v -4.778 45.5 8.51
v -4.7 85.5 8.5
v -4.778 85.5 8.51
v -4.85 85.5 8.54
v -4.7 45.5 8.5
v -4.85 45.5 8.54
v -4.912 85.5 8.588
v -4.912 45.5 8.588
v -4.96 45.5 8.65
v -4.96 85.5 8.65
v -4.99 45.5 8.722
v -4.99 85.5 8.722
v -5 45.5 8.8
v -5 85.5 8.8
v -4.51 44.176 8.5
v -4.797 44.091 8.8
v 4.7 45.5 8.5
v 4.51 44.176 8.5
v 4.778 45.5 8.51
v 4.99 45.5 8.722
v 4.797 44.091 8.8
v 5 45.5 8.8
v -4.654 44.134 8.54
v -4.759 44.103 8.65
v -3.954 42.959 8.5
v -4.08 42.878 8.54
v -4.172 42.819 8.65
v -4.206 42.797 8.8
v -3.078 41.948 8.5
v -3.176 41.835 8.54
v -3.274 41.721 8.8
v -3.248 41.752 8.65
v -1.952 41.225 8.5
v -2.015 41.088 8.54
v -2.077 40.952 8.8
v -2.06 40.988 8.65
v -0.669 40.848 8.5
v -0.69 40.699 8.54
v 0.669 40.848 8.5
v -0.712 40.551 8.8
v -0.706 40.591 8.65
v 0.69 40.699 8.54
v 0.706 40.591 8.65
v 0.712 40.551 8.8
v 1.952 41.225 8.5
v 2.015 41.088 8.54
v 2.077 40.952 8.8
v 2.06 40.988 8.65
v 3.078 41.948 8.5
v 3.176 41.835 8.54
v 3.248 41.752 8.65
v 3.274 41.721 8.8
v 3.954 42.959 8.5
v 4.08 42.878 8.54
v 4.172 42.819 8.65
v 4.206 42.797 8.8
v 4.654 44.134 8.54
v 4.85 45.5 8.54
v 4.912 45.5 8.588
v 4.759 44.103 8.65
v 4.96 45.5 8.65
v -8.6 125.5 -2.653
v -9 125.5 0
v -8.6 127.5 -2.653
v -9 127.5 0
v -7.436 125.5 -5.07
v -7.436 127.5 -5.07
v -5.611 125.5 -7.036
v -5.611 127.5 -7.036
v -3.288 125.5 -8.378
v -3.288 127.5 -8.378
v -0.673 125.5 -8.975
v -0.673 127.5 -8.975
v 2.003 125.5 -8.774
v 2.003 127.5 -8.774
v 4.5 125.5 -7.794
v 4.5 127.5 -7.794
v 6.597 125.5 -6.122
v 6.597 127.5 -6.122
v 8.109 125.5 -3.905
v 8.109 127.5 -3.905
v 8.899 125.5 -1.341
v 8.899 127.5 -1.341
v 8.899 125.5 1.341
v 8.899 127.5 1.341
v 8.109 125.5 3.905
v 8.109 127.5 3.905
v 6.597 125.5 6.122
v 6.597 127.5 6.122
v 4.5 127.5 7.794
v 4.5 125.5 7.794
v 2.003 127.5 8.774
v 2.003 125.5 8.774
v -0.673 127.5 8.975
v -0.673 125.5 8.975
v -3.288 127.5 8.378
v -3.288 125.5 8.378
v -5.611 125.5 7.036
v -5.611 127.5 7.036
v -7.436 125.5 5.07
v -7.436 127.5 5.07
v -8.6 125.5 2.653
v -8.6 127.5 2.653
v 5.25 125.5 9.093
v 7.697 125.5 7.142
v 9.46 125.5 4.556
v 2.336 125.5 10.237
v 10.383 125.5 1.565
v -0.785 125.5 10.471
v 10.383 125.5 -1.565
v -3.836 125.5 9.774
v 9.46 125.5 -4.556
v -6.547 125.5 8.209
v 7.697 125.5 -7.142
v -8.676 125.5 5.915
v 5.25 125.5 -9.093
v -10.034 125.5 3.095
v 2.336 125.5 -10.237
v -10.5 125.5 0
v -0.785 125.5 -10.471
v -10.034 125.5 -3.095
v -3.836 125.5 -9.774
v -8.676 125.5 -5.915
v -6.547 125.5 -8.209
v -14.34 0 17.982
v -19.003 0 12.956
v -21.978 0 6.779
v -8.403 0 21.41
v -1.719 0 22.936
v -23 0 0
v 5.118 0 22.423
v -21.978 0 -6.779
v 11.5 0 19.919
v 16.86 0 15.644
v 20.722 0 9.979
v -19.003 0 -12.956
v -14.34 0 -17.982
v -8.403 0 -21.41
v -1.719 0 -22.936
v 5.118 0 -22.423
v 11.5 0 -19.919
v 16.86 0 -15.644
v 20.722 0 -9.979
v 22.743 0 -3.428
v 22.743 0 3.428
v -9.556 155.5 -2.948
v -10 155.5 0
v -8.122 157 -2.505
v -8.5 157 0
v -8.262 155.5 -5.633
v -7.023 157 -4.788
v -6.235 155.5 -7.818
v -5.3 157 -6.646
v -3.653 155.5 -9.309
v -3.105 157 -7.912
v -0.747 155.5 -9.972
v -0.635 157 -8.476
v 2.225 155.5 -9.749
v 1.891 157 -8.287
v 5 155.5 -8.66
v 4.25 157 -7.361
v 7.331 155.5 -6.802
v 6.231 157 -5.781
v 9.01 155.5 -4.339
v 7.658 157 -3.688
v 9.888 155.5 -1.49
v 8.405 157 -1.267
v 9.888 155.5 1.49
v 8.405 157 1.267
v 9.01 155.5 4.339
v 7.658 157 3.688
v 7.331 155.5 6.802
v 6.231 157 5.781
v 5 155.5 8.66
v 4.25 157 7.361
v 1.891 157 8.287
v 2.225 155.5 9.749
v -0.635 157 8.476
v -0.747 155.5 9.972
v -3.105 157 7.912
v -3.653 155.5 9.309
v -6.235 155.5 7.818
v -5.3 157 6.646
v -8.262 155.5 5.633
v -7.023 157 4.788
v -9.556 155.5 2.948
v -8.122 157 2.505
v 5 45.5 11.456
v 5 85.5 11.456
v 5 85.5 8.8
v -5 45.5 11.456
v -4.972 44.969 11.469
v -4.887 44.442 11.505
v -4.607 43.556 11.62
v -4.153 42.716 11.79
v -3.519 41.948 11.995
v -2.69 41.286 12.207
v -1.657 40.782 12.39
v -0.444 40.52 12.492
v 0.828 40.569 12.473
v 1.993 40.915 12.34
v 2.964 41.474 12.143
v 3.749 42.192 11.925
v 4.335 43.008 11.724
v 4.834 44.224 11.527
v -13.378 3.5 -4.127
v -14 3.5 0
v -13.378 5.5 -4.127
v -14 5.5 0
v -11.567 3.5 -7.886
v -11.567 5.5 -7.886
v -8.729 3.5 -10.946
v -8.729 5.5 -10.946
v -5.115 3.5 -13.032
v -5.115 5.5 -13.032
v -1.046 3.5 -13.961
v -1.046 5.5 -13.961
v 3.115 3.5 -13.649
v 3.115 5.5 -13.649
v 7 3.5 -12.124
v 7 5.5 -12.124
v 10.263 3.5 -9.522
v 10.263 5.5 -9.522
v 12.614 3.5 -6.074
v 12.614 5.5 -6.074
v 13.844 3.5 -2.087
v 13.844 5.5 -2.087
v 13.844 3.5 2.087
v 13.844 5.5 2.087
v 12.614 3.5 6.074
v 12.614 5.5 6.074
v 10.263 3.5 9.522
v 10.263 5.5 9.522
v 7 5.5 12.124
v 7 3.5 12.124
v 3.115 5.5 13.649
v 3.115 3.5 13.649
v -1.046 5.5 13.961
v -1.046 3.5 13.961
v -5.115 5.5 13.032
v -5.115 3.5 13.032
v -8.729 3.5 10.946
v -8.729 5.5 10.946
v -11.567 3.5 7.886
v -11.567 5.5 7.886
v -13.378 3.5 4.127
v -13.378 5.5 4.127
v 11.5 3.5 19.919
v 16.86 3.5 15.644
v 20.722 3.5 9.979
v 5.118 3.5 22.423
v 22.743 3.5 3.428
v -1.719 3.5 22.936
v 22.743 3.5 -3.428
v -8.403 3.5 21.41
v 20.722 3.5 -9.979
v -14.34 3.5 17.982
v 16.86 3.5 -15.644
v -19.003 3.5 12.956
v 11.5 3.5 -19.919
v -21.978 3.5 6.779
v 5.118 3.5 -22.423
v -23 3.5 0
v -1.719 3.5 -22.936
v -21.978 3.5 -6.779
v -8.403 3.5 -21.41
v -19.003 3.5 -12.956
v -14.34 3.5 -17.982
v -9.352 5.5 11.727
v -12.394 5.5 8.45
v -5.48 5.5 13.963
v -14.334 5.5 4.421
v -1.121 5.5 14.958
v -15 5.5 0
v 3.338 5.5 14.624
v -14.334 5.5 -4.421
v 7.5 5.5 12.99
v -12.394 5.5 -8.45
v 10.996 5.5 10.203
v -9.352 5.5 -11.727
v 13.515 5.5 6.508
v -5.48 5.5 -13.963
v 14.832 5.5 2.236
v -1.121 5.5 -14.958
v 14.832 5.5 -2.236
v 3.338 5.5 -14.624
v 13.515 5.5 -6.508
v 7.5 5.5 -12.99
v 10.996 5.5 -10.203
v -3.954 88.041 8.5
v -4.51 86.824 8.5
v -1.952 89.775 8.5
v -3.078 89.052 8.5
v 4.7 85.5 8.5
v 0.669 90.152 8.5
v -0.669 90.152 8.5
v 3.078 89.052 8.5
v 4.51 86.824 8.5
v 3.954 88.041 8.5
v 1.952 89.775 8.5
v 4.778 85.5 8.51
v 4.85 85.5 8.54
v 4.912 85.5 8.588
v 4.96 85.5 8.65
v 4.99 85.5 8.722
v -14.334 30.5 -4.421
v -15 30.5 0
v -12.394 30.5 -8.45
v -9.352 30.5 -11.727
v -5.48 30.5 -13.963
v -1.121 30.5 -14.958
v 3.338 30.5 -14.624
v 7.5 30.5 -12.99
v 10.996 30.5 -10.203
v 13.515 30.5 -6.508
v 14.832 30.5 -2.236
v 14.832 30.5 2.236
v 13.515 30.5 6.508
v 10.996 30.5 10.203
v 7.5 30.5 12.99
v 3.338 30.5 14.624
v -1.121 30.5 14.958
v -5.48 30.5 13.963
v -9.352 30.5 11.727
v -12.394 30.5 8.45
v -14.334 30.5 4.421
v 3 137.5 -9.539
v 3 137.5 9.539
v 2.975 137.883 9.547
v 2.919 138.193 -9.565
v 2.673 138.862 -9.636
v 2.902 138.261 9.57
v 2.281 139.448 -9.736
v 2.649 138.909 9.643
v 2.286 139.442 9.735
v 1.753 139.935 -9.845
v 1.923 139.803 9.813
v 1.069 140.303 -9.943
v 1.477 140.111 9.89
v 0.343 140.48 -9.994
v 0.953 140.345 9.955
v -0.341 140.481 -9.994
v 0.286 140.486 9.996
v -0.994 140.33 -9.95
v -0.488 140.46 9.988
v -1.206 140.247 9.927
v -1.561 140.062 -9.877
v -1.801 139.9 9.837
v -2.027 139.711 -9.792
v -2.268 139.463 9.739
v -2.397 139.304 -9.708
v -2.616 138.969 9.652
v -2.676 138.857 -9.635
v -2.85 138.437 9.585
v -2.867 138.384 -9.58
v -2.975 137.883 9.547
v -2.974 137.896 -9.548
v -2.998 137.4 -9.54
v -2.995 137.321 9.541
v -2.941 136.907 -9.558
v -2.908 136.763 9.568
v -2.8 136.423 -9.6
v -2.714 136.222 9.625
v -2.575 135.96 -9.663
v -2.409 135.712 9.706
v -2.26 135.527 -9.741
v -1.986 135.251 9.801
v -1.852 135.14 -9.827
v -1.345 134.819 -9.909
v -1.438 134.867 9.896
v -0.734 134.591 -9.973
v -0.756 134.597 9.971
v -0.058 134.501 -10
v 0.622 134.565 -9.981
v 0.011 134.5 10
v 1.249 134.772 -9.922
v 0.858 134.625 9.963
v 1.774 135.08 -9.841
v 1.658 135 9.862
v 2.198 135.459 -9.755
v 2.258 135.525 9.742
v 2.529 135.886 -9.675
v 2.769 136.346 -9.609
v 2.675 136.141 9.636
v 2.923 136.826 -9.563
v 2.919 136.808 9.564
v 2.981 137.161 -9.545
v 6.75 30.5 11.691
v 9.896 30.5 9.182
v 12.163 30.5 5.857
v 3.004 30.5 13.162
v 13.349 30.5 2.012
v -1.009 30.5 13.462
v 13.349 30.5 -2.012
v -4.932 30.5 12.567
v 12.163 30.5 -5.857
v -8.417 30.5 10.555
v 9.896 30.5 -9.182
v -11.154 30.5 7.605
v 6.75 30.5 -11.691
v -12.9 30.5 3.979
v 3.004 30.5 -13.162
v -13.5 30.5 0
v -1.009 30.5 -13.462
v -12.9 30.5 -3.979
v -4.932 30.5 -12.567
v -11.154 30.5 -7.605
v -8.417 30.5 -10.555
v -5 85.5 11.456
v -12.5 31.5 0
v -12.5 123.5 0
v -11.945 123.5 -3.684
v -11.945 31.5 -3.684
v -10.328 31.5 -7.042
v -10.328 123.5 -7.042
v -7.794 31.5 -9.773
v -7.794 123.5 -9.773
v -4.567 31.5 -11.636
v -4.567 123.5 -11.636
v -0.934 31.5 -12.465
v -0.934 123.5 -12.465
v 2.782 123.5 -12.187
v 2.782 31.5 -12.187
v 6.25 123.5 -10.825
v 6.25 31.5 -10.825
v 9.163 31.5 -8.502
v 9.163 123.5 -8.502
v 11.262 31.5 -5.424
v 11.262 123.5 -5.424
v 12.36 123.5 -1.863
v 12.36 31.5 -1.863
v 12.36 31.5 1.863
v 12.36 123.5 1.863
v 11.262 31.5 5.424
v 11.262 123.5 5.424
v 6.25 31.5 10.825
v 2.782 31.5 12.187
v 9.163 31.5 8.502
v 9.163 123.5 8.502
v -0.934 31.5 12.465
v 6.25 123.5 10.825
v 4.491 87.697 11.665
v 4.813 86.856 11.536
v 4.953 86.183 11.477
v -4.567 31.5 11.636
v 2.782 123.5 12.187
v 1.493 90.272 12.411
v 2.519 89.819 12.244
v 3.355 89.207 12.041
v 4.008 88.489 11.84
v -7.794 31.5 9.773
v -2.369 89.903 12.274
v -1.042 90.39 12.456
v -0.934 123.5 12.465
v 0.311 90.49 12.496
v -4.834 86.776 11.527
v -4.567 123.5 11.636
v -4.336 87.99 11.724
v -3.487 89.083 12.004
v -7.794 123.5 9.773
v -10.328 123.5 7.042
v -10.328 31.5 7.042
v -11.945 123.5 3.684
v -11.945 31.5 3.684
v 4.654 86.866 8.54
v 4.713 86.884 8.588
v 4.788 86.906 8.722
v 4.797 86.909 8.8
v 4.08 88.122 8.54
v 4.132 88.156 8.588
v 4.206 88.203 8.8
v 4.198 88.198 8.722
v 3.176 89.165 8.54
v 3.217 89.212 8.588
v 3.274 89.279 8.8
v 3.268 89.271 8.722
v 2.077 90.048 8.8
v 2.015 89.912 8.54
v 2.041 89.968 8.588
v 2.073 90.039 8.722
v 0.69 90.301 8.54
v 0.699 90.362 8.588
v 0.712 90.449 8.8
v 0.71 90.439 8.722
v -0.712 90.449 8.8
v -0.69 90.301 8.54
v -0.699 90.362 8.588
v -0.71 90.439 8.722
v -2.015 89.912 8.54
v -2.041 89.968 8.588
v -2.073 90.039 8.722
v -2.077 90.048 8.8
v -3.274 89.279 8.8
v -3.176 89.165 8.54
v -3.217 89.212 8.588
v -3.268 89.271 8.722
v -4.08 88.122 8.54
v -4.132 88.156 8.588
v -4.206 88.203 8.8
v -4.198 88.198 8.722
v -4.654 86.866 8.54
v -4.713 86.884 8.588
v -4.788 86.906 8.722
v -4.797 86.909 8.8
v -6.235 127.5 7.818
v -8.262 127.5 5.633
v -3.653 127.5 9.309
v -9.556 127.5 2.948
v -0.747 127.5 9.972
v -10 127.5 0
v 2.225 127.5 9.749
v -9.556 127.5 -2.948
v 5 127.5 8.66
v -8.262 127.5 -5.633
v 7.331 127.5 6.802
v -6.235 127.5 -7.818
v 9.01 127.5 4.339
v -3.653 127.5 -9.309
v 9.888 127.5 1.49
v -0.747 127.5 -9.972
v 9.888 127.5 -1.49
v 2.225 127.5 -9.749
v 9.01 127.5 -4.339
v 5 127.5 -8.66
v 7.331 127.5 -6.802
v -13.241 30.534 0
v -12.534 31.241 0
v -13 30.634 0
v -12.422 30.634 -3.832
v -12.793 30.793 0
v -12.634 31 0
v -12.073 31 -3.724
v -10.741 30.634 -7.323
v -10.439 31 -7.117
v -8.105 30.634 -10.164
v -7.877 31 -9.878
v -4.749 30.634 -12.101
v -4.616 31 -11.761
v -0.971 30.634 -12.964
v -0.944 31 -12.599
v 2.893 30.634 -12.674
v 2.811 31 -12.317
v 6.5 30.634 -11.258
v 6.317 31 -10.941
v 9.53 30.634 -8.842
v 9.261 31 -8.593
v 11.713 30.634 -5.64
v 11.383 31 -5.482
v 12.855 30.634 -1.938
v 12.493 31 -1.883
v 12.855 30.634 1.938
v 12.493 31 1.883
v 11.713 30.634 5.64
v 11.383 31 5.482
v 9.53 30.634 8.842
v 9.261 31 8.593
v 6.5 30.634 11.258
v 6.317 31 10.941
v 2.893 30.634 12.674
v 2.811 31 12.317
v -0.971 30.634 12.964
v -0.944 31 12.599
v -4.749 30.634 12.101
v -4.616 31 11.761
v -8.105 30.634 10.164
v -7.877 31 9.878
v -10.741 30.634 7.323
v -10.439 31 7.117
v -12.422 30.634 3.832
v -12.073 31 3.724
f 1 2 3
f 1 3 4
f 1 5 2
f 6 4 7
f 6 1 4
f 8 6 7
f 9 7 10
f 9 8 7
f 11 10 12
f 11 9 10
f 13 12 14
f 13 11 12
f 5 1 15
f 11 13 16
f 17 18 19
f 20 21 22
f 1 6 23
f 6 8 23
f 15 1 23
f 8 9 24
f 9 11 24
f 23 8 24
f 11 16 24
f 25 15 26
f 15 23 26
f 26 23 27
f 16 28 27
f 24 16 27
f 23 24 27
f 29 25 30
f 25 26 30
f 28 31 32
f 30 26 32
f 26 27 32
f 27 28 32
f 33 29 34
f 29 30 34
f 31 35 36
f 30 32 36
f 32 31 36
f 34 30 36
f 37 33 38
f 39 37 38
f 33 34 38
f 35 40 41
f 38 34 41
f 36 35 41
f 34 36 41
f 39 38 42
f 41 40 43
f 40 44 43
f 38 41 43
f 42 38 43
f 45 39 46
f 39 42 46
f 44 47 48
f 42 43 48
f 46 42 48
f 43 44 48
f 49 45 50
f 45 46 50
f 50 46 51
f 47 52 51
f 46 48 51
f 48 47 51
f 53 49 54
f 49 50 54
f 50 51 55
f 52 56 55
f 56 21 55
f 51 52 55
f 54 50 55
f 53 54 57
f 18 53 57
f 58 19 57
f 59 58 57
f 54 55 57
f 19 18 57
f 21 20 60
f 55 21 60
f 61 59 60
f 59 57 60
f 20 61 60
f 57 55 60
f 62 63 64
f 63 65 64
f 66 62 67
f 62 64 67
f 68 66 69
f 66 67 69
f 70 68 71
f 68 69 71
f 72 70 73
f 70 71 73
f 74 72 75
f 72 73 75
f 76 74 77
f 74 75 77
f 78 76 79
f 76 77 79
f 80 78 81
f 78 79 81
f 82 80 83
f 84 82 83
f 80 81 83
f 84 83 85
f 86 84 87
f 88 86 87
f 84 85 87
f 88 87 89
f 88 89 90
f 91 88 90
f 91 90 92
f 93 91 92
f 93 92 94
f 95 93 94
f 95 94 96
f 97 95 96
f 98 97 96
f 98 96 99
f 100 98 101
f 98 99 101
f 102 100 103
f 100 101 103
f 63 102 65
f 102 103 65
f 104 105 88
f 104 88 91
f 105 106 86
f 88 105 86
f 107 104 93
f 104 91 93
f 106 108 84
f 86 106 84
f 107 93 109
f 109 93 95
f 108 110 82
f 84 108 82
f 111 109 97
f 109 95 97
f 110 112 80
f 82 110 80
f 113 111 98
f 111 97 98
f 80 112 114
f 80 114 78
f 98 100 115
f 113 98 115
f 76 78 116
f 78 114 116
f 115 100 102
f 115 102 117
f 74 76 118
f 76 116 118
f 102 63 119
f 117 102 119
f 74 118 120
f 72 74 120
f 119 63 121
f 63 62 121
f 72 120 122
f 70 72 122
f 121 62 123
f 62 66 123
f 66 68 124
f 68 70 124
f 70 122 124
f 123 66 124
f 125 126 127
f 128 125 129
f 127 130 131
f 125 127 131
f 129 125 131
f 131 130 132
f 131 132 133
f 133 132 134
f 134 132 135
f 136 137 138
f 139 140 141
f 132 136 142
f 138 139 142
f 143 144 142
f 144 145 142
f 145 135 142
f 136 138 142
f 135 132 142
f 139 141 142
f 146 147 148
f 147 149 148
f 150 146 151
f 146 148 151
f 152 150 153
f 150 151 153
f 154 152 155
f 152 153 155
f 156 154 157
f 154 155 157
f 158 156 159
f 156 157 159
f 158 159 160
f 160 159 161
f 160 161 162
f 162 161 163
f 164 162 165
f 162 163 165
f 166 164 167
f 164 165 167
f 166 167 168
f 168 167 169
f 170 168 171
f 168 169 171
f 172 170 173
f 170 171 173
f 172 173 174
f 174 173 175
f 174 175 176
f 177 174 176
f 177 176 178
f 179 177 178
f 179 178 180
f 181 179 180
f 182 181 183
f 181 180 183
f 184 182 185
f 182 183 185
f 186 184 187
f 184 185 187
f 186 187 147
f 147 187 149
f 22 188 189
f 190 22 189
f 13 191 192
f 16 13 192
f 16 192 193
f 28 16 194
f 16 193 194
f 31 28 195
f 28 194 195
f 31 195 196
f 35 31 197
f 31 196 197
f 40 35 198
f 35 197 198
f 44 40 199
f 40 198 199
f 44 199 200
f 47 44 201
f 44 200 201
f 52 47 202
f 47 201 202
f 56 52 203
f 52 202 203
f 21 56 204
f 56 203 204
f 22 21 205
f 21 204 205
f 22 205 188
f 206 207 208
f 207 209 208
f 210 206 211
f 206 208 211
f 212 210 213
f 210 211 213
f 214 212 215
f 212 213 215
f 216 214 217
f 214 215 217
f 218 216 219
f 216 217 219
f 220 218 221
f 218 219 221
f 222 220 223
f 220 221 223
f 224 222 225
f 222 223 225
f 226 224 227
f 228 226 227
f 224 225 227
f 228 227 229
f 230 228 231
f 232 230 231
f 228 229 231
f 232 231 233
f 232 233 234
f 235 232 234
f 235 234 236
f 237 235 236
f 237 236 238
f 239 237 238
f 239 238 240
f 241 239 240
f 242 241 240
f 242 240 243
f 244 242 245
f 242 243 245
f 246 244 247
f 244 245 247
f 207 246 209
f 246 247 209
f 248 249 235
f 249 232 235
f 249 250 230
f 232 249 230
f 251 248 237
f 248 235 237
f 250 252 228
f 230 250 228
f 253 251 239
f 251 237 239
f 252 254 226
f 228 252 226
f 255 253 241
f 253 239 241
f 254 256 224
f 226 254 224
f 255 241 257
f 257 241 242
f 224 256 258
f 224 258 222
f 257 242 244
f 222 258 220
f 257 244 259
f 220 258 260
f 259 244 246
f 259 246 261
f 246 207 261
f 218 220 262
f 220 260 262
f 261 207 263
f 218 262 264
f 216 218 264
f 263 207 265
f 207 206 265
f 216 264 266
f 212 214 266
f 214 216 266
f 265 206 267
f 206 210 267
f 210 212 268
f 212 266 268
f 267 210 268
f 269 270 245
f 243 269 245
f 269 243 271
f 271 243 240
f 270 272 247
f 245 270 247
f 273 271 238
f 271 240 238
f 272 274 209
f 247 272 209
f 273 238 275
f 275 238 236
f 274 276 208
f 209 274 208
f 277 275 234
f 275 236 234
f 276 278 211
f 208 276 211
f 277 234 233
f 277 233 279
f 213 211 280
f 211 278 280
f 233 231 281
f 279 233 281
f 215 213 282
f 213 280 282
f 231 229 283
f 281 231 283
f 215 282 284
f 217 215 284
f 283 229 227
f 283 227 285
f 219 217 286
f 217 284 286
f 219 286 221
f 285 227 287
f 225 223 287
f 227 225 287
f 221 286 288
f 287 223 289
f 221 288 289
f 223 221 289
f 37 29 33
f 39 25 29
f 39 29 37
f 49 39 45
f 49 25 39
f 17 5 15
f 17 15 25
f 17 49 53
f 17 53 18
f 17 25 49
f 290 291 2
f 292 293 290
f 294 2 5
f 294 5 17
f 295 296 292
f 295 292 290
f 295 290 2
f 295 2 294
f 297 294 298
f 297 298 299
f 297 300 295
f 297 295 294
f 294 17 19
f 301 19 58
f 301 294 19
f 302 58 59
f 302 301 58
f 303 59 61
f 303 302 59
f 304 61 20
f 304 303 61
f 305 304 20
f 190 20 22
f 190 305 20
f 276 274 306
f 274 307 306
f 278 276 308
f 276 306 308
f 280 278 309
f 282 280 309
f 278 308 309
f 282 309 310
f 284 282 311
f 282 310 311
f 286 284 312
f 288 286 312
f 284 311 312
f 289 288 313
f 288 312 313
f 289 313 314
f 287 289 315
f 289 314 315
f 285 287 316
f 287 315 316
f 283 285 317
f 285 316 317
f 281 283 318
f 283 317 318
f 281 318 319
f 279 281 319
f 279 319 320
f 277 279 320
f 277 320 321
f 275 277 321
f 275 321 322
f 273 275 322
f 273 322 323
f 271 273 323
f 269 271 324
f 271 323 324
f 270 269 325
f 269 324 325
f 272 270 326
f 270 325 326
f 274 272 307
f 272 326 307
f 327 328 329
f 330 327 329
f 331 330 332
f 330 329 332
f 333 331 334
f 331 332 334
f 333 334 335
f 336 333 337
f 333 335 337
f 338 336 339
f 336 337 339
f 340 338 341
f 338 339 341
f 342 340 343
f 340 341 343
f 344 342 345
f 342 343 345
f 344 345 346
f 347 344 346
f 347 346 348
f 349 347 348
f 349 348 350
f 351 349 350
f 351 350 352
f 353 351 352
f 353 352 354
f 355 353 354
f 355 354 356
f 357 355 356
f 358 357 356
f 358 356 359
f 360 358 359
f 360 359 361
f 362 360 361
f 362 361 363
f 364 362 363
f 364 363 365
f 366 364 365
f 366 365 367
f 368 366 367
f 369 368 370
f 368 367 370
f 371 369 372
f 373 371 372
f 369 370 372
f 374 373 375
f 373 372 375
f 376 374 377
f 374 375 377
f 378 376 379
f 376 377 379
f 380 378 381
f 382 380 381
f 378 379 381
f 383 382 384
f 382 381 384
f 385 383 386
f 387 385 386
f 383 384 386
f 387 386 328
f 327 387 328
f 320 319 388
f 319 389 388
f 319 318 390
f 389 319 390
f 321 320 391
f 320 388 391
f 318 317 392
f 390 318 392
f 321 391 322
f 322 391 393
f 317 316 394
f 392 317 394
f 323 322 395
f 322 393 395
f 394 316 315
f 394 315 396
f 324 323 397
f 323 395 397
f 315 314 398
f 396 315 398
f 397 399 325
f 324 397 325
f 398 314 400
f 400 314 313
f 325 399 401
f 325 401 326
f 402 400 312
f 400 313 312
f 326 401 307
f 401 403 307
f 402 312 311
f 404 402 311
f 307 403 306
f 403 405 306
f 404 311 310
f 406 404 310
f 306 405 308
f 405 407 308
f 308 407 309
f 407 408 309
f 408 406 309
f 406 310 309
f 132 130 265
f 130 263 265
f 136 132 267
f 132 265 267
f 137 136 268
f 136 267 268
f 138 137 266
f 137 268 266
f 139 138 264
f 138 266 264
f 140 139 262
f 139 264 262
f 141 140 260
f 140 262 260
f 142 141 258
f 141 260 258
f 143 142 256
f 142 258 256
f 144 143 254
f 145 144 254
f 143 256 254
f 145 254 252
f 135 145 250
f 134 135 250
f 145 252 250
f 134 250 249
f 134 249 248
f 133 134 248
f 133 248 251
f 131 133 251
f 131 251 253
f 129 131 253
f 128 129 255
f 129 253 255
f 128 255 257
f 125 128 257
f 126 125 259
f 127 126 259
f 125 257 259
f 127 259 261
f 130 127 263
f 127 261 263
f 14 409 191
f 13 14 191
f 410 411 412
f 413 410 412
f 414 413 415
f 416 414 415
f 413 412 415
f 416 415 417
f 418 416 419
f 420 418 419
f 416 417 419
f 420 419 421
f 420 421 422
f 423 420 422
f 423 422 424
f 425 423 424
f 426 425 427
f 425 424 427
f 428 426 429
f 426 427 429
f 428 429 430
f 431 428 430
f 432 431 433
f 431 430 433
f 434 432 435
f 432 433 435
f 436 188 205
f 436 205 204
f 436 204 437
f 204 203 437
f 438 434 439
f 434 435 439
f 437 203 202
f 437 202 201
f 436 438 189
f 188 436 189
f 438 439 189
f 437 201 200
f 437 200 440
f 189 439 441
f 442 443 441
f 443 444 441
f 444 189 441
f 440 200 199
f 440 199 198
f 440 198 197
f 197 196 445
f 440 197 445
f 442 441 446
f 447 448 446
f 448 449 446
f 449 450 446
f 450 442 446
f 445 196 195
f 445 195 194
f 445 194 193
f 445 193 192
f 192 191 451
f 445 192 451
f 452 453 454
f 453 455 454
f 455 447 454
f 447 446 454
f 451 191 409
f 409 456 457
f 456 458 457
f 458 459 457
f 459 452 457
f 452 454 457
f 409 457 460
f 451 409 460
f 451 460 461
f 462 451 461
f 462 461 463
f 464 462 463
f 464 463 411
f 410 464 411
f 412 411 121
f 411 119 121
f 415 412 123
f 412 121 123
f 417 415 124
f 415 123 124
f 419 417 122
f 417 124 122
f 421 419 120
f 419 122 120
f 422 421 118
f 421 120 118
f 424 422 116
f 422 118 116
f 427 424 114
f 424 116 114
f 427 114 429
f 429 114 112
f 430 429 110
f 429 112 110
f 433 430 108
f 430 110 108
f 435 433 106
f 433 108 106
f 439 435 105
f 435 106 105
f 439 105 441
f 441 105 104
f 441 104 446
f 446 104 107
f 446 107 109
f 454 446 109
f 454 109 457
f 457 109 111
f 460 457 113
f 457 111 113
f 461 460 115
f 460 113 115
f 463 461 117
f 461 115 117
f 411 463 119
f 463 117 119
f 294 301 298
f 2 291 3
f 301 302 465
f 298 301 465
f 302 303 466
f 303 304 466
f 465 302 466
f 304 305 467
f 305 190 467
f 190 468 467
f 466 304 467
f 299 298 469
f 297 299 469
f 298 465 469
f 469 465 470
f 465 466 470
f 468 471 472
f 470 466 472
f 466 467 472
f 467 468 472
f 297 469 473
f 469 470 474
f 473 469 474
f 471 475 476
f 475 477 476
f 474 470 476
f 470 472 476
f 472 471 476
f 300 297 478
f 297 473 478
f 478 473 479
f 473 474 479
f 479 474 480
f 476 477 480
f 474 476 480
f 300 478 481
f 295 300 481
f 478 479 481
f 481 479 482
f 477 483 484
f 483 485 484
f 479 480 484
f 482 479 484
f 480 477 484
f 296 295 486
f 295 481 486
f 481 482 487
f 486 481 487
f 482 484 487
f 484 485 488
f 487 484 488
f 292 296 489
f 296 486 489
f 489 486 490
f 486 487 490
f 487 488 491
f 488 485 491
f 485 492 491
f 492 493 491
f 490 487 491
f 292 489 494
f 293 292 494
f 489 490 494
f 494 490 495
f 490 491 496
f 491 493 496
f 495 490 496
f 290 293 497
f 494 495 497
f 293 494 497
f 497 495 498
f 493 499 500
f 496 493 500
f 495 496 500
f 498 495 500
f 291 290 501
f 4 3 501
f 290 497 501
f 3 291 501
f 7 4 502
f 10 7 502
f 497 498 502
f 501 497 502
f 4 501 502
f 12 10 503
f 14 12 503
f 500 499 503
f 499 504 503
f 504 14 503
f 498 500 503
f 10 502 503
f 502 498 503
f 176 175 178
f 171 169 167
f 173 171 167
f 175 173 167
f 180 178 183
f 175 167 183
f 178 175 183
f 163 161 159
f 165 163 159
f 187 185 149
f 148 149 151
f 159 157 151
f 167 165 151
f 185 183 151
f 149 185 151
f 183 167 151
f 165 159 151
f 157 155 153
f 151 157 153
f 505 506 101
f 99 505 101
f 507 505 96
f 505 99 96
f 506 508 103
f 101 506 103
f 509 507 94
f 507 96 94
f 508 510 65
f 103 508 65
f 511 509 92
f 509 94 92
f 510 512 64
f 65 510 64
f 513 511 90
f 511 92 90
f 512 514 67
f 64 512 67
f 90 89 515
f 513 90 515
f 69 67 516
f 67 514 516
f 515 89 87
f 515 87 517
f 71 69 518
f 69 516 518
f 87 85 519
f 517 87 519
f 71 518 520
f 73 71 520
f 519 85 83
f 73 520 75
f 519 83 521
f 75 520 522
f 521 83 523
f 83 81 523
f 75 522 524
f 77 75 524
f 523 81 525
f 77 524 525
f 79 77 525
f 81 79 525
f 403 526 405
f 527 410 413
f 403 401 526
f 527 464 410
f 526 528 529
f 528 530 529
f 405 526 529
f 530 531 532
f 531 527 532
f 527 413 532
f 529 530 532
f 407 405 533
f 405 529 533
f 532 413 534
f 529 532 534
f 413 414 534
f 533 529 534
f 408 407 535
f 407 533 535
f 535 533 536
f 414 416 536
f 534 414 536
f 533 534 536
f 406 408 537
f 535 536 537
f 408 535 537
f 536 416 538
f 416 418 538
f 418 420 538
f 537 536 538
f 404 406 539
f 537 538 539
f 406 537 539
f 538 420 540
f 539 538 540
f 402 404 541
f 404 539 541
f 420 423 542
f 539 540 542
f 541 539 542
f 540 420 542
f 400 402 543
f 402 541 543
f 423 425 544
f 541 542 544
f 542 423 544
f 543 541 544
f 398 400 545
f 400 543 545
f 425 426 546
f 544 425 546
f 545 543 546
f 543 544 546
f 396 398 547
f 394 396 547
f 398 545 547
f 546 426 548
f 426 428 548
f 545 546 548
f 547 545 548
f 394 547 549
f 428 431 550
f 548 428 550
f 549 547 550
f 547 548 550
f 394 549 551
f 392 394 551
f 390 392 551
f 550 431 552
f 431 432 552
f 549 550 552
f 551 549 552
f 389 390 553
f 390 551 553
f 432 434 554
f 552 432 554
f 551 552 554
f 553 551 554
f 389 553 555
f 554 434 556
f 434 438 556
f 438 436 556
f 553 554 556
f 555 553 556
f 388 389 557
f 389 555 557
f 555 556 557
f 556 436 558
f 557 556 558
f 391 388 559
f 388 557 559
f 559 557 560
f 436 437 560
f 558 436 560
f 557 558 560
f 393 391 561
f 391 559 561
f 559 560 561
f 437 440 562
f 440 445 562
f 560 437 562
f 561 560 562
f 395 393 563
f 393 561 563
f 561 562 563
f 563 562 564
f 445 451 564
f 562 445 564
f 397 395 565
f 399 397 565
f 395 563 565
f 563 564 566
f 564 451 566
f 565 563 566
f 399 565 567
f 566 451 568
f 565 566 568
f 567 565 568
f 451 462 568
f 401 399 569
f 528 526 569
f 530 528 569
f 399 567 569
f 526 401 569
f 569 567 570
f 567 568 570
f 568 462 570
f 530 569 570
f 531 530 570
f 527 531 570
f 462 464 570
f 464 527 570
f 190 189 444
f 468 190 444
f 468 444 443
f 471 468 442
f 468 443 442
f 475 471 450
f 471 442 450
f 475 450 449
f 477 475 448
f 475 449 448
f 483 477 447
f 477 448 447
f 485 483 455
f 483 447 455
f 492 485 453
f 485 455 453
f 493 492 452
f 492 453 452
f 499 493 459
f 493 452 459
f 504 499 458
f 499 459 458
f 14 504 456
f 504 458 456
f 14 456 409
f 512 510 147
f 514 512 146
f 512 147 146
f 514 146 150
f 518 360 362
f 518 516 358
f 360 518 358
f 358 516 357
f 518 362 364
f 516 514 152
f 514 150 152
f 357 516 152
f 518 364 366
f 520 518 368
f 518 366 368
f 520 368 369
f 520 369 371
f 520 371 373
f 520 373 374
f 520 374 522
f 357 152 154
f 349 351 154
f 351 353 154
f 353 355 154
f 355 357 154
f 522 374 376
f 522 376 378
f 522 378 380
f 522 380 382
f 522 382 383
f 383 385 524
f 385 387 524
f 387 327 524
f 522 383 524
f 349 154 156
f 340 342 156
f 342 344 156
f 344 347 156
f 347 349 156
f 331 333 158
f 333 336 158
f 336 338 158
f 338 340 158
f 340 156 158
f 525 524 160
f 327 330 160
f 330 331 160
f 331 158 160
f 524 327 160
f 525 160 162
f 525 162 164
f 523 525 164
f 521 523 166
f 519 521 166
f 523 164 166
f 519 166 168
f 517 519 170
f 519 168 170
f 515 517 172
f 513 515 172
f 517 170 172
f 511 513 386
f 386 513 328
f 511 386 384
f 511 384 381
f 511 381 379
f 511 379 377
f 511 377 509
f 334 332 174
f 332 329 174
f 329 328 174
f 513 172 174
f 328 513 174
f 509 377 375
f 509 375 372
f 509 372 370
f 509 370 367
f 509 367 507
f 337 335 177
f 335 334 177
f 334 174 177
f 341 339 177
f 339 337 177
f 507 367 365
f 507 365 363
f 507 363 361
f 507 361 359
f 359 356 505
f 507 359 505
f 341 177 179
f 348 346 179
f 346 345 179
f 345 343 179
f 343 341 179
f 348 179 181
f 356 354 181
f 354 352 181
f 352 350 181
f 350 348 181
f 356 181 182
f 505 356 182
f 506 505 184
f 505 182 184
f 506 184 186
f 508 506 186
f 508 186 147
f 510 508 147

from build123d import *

# Parameters (mm, degrees)
CUT_EXTRUDE_1_DEPTH = 4
FILLET_1_R          = 0.3
SKETCH_3_R          = 3
CUT_EXTRUDE_2_DEPTH = 25


with BuildPart() as part:
    # Эскиз1 → Повернуть1 (revolve)
    with BuildSketch(Plane.XY, mode=Mode.PRIVATE) as revolve_1_sk:
        with BuildLine():
            Line((0, 157), (0, 0))
            Line((0, 0), (23, 0))
            Line((23, 0), (23, 3.5))
            Line((23, 3.5), (14, 3.5))
            Line((14, 3.5), (14, 5.5))
            Line((14, 5.5), (15, 5.5))
            Line((15, 5.5), (15, 30.5))
            Line((15, 30.5), (13.5, 30.5))
            ThreePointArc((13.5, 30.5), (12.792893219, 30.792893219), (12.5, 31.5))
            Line((12.5, 31.5), (12.5, 123.5))
            Line((12.5, 123.5), (10.5, 125.5))
            Line((10.5, 125.5), (9, 125.5))
            Line((9, 125.5), (9, 127.5))
            Line((9, 127.5), (10, 127.5))
            Line((10, 127.5), (10, 155.5))
            Line((10, 155.5), (8.5, 157))
            Line((8.5, 157), (0, 157))
        make_face()
    revolve(revolve_1_sk.sketch.rotate(Axis((0, 157, 0), (0, -1, 0)), 180), axis=Axis((0, 157, 0), (0, -1, 0)))

    # Эскиз2 → Вырез-Вытянуть1 (cut)
    with BuildSketch(Plane.XY.offset(12.5)):
        with BuildLine():
            Line((5, 45.5), (5, 85.5))
            ThreePointArc((5, 85.5), (0, 90.5), (-5, 85.5))
            Line((-5, 85.5), (-5, 45.5))
            ThreePointArc((-5, 45.5), (0, 40.5), (5, 45.5))
        make_face()
    extrude(amount=-CUT_EXTRUDE_1_DEPTH, mode=Mode.SUBTRACT)

    # Скругление1
    fillet_1_edges = [part.edges().sort_by_distance(p)[0] for p in [
        (0, 40.5, 8.5),
        (-5, 65.5, 8.5),
        (0, 90.5, 8.5),
        (5, 65.5, 8.5),
    ]]
    fillet(fillet_1_edges, radius=FILLET_1_R)

    # Эскиз3 → Вырез-Вытянуть2 (cut)
    with BuildSketch(Plane.XY.offset(10)):
        with Locations((0, 137.5)):
            Circle(SKETCH_3_R)
    extrude(amount=-CUT_EXTRUDE_2_DEPTH, mode=Mode.SUBTRACT)


solid = part.part
